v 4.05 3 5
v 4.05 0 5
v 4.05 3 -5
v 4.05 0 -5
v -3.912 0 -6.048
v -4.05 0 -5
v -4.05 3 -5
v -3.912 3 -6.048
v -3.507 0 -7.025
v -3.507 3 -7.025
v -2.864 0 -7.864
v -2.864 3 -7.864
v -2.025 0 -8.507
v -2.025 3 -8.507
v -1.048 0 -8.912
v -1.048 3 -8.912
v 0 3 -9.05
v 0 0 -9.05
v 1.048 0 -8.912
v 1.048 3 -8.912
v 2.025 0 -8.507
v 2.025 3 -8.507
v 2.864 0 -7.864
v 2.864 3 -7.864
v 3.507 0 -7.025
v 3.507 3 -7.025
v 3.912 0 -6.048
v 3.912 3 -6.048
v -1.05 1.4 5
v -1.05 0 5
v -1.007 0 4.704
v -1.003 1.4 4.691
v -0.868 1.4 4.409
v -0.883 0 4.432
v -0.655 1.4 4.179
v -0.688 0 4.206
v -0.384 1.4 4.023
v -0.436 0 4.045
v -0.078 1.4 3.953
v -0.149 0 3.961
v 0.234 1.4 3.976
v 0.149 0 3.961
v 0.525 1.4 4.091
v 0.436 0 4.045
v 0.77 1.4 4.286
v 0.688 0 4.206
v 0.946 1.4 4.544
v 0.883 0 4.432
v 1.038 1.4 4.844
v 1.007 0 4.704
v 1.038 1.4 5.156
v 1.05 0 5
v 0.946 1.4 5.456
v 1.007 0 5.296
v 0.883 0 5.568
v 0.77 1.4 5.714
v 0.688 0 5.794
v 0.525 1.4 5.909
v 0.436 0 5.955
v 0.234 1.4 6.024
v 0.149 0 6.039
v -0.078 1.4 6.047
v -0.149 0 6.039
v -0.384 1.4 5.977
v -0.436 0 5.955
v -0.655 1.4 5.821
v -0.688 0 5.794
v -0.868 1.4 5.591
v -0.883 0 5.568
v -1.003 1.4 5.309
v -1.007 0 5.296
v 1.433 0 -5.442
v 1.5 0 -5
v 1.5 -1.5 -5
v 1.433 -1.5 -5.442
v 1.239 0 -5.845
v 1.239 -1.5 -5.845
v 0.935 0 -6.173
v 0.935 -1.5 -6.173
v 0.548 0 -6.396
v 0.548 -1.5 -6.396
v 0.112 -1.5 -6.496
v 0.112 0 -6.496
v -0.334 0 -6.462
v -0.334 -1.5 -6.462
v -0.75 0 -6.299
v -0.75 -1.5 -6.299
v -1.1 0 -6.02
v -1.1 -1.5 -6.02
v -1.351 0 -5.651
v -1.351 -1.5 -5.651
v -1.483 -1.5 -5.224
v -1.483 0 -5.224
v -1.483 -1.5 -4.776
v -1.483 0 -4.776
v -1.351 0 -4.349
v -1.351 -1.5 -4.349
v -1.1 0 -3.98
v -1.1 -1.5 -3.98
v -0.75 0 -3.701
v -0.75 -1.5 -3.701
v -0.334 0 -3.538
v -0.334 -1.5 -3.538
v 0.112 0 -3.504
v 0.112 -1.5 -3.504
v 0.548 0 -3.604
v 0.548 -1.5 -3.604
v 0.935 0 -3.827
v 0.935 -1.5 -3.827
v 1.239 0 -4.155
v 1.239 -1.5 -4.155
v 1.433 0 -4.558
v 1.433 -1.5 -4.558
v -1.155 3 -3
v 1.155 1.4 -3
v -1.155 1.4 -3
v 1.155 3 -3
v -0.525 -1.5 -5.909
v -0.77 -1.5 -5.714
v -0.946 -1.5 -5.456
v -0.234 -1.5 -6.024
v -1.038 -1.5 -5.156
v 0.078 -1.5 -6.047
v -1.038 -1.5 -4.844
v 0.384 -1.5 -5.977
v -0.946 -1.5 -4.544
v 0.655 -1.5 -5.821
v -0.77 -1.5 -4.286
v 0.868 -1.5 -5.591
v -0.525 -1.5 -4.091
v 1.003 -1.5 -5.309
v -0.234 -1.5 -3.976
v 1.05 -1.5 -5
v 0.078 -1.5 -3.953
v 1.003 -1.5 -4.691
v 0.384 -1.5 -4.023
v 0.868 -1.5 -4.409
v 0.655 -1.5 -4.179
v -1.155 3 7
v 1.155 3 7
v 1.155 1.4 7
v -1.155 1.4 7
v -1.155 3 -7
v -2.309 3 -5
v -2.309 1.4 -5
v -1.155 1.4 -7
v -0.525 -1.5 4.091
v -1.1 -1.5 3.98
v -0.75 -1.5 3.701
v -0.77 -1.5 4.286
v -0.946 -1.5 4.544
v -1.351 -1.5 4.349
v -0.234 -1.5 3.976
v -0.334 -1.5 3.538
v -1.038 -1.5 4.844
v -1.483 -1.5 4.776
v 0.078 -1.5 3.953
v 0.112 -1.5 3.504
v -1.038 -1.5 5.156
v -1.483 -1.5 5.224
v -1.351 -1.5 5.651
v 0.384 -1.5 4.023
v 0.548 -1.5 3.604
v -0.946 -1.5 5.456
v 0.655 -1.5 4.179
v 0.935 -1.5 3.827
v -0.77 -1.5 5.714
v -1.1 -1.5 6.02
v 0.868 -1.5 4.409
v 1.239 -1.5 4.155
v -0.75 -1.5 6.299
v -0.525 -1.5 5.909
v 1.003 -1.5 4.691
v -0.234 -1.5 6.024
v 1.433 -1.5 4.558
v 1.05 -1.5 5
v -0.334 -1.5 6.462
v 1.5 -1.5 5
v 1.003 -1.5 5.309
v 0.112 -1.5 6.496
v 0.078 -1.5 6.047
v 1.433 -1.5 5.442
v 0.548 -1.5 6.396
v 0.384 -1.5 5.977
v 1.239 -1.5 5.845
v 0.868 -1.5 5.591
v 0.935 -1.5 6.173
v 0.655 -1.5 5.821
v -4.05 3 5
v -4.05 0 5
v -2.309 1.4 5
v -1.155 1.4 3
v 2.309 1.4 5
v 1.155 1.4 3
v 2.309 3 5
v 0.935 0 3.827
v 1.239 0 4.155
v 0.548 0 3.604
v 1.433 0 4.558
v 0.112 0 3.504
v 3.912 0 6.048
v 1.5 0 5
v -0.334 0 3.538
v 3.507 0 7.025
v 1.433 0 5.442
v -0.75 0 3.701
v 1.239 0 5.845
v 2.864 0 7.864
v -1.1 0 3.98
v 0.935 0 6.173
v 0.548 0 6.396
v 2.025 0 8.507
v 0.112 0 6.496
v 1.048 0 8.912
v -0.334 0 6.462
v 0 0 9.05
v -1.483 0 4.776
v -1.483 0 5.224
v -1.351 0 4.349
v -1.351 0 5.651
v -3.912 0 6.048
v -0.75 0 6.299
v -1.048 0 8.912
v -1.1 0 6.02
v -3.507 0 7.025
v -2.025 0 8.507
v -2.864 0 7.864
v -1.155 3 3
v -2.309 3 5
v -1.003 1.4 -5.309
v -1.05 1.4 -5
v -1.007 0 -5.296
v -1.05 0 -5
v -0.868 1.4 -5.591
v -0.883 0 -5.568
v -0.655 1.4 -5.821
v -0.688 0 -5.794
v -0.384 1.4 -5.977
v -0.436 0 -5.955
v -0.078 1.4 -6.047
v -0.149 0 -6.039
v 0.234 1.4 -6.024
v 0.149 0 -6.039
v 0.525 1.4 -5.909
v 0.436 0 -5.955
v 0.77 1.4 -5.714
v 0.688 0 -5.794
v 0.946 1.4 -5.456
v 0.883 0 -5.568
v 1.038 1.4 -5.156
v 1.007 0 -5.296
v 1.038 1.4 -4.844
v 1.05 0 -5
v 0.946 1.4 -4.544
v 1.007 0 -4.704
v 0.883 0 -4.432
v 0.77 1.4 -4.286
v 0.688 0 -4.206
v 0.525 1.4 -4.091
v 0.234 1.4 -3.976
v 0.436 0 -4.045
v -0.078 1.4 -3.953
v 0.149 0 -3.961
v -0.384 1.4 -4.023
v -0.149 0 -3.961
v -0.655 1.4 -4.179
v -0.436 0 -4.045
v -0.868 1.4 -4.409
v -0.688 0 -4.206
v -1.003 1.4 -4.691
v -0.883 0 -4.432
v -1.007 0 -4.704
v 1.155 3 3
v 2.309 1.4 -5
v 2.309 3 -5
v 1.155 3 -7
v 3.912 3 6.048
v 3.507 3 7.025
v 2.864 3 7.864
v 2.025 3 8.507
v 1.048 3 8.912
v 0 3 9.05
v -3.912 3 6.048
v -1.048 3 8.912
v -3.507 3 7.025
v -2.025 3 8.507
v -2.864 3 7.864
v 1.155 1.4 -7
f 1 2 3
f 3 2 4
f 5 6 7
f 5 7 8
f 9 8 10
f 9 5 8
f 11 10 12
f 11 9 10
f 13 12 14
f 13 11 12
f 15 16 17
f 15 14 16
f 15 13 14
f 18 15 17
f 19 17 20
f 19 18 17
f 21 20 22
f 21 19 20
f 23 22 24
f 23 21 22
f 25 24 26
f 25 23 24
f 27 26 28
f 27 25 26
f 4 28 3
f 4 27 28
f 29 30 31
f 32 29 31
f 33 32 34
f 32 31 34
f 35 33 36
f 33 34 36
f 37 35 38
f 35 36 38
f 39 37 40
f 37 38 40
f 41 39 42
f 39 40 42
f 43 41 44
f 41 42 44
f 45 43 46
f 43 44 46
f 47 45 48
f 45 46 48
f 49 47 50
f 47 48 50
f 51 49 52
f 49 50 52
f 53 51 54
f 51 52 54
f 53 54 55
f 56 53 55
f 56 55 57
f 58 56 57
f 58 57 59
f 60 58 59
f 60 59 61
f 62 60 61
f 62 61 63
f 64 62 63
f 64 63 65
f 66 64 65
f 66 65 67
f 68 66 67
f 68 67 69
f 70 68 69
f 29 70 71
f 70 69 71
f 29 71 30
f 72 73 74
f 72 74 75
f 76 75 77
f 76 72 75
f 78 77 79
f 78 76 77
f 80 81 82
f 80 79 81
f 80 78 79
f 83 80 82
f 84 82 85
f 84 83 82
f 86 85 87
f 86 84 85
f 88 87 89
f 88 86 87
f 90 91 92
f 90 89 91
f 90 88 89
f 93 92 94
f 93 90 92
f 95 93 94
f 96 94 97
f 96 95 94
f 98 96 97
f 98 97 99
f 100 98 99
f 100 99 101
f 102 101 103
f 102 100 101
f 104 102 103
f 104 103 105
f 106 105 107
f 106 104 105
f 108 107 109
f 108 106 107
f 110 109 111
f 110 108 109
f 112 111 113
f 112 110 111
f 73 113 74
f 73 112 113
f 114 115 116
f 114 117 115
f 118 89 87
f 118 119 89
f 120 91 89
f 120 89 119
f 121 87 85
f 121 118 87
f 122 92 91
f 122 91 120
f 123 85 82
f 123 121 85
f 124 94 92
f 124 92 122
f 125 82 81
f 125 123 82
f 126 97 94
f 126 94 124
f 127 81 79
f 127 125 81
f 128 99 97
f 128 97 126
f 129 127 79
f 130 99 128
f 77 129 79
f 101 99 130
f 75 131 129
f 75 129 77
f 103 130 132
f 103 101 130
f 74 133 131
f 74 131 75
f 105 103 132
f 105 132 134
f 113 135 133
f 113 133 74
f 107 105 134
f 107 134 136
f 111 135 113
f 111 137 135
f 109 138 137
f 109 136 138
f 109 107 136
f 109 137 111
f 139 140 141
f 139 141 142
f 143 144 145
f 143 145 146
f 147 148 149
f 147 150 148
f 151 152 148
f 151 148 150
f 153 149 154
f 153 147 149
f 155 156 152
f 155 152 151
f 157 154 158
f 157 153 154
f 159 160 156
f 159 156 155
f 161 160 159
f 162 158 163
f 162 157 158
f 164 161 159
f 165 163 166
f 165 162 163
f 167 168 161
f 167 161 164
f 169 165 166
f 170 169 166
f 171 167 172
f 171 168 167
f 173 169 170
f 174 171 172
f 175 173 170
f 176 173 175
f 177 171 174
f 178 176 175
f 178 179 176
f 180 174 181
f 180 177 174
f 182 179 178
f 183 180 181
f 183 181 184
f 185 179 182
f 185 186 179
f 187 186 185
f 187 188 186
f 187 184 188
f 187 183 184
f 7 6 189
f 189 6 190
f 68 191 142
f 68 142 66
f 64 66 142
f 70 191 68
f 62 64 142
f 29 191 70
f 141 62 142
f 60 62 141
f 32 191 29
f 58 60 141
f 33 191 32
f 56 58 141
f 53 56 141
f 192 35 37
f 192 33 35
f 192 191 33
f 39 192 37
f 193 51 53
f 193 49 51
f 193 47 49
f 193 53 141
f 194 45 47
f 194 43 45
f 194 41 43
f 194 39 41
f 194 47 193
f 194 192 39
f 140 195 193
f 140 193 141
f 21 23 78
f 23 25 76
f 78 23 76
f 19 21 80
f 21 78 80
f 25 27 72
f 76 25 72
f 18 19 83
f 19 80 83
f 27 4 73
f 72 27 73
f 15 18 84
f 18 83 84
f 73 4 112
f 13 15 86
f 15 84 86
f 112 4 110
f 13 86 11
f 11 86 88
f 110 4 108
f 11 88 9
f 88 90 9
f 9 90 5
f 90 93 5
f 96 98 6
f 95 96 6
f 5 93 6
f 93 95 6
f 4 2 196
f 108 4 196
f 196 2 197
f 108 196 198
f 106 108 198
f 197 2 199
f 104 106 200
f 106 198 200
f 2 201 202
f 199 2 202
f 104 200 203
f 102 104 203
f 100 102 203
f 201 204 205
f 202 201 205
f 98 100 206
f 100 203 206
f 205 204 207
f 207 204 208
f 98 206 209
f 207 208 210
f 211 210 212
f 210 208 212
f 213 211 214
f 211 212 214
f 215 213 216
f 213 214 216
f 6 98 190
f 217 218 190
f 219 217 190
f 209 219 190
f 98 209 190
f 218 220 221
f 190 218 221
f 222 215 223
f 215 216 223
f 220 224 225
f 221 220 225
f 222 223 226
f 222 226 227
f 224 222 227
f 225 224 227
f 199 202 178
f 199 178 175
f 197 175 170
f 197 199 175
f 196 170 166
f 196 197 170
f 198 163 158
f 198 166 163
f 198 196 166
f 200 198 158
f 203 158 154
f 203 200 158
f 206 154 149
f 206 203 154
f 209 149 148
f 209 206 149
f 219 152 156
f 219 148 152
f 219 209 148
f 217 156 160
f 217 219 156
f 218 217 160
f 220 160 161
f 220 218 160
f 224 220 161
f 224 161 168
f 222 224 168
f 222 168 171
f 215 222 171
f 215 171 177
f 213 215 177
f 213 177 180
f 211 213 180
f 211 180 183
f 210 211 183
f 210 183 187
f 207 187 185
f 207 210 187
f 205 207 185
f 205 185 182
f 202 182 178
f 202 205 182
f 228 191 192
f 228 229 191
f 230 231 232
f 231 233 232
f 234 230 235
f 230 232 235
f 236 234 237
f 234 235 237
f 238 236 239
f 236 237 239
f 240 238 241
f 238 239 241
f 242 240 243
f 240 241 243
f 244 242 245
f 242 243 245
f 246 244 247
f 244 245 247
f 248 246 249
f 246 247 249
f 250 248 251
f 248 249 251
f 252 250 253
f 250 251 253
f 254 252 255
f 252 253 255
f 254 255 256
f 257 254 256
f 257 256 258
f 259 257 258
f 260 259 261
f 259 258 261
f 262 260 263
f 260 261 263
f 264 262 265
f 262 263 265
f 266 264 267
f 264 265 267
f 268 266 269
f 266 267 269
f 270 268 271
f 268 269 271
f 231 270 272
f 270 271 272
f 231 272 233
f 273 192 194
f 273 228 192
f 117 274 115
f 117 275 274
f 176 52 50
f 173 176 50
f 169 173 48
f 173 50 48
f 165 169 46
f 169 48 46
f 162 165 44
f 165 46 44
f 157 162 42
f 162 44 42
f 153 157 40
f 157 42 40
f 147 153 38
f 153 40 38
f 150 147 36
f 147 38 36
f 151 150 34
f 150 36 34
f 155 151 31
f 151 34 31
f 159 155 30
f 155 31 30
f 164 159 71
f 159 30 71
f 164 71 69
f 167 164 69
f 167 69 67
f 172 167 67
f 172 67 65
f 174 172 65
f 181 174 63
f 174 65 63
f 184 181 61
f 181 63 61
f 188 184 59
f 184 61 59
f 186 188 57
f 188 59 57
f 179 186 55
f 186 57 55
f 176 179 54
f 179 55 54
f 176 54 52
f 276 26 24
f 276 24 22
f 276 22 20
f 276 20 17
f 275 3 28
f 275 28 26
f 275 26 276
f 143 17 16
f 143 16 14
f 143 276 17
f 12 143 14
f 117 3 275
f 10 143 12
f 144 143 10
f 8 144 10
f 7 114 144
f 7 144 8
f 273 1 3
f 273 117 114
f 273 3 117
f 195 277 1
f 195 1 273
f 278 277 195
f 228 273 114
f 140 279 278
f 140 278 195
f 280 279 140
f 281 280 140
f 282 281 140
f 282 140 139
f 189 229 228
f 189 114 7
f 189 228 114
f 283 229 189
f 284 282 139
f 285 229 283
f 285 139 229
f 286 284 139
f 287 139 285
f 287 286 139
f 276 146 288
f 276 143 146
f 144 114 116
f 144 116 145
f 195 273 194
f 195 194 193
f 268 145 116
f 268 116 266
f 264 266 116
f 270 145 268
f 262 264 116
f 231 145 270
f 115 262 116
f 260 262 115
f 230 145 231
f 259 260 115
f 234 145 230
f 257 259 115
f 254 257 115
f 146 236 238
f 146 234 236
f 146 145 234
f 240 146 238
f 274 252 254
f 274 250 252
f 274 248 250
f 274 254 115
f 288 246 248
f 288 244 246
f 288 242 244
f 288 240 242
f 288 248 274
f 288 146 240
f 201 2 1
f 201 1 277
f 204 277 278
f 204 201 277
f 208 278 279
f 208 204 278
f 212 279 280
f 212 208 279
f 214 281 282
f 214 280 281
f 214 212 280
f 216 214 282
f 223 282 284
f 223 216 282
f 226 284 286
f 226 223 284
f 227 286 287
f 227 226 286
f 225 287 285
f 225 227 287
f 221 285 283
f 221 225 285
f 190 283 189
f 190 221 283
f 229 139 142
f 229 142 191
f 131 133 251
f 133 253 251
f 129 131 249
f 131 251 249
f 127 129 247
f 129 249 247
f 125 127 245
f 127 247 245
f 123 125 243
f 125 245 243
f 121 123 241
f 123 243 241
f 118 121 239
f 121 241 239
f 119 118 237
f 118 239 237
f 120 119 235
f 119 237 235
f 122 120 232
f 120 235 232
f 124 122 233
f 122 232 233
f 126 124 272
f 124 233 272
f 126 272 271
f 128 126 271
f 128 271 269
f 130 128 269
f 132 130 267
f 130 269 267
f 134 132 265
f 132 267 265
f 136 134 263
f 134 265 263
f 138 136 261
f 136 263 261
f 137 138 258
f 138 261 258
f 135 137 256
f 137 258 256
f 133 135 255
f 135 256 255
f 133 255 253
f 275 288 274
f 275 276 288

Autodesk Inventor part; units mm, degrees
ref_plane "YZ Plane" through (0, 0, 0) normal (1, 0, 0) x (0, 1, 0)
ref_plane "XZ Plane" through (0, 0, 0) normal (0, 1, 0) x (-1, 0, 0)
ref_plane "XY Plane" through (0, 0, 0) normal (0, 0, 1) x (1, 0, 0)
sketch "Skizze1" plane through (0, 0, 0) normal (0, 1, 0) x (-1, 0, 0)
  circle A0 centre (0, 5) radius 1.05
  circle A1 centre (0, -5) radius 1.05
  line L0 (0, 5) -> (0, -5) construction
  line L1 (0, 5) -> (0, -5) construction
  line L2 (-4.05, 5) -> (-4.05, -5)
  line L3 (4.05, -5) -> (4.05, 5)
  arc A2 (4.05, 5) -> (-4.05, 5) centre (0, 5) ccw
  arc A3 (-4.05, -5) -> (4.05, -5) centre (0, -5) ccw
  point P0 (0, 0)
  point P1 (0, 0)
  point P2 (0, 0)
  dimension "d0" = 2.1
  dimension "d1" = 10
  dimension "d2" = 3
extrude "Extrusion1" add sketch "Skizze1" along normal blind 3
sketch "Skizze2" plane through (0, 3, 0) normal (0, 1, 0) x (1, 0, 0)
  circle A0 centre (0, 5) radius 1.05 projected
  line L0 (2.3094, 5) -> (1.1547, 3)
  line L1 (1.1547, 3) -> (-1.1547, 3)
  line L2 (-1.1547, 3) -> (-2.3094, 5)
  line L3 (-2.3094, 5) -> (-1.1547, 7)
  line L4 (-1.1547, 7) -> (1.1547, 7)
  line L5 (1.1547, 7) -> (2.3094, 5)
  circle A1 centre (0, -5) radius 1.05 projected
  line L6 (1.1547, -3) -> (2.3094, -5)
  line L7 (2.3094, -5) -> (1.1547, -7)
  line L8 (1.1547, -7) -> (-1.1547, -7)
  line L9 (-1.1547, -7) -> (-2.3094, -5)
  line L10 (-2.3094, -5) -> (-1.1547, -3)
  line L11 (-1.1547, -3) -> (1.1547, -3)
  point P0 (0, 0)
  dimension "d5" = 4
extrude "Extrusion2" cut sketch "Skizze2" against normal blind 1.6
sketch "Skizze3" plane through (0, 0, 0) normal (0, -1, 0) x (1, 0, 0)
  circle A0 centre (0, -5) radius 1.05 projected
  circle A1 centre (0, -5) radius 1.5
  circle A2 centre (0, 5) radius 1.05 projected
  circle A3 centre (0, 5) radius 1.5
  point P0 (0, 0)
  dimension "d8" = 3
extrude "Extrusion3" add sketch "Skizze3" along normal blind 1.5
properties part number "_3D-Druck"
